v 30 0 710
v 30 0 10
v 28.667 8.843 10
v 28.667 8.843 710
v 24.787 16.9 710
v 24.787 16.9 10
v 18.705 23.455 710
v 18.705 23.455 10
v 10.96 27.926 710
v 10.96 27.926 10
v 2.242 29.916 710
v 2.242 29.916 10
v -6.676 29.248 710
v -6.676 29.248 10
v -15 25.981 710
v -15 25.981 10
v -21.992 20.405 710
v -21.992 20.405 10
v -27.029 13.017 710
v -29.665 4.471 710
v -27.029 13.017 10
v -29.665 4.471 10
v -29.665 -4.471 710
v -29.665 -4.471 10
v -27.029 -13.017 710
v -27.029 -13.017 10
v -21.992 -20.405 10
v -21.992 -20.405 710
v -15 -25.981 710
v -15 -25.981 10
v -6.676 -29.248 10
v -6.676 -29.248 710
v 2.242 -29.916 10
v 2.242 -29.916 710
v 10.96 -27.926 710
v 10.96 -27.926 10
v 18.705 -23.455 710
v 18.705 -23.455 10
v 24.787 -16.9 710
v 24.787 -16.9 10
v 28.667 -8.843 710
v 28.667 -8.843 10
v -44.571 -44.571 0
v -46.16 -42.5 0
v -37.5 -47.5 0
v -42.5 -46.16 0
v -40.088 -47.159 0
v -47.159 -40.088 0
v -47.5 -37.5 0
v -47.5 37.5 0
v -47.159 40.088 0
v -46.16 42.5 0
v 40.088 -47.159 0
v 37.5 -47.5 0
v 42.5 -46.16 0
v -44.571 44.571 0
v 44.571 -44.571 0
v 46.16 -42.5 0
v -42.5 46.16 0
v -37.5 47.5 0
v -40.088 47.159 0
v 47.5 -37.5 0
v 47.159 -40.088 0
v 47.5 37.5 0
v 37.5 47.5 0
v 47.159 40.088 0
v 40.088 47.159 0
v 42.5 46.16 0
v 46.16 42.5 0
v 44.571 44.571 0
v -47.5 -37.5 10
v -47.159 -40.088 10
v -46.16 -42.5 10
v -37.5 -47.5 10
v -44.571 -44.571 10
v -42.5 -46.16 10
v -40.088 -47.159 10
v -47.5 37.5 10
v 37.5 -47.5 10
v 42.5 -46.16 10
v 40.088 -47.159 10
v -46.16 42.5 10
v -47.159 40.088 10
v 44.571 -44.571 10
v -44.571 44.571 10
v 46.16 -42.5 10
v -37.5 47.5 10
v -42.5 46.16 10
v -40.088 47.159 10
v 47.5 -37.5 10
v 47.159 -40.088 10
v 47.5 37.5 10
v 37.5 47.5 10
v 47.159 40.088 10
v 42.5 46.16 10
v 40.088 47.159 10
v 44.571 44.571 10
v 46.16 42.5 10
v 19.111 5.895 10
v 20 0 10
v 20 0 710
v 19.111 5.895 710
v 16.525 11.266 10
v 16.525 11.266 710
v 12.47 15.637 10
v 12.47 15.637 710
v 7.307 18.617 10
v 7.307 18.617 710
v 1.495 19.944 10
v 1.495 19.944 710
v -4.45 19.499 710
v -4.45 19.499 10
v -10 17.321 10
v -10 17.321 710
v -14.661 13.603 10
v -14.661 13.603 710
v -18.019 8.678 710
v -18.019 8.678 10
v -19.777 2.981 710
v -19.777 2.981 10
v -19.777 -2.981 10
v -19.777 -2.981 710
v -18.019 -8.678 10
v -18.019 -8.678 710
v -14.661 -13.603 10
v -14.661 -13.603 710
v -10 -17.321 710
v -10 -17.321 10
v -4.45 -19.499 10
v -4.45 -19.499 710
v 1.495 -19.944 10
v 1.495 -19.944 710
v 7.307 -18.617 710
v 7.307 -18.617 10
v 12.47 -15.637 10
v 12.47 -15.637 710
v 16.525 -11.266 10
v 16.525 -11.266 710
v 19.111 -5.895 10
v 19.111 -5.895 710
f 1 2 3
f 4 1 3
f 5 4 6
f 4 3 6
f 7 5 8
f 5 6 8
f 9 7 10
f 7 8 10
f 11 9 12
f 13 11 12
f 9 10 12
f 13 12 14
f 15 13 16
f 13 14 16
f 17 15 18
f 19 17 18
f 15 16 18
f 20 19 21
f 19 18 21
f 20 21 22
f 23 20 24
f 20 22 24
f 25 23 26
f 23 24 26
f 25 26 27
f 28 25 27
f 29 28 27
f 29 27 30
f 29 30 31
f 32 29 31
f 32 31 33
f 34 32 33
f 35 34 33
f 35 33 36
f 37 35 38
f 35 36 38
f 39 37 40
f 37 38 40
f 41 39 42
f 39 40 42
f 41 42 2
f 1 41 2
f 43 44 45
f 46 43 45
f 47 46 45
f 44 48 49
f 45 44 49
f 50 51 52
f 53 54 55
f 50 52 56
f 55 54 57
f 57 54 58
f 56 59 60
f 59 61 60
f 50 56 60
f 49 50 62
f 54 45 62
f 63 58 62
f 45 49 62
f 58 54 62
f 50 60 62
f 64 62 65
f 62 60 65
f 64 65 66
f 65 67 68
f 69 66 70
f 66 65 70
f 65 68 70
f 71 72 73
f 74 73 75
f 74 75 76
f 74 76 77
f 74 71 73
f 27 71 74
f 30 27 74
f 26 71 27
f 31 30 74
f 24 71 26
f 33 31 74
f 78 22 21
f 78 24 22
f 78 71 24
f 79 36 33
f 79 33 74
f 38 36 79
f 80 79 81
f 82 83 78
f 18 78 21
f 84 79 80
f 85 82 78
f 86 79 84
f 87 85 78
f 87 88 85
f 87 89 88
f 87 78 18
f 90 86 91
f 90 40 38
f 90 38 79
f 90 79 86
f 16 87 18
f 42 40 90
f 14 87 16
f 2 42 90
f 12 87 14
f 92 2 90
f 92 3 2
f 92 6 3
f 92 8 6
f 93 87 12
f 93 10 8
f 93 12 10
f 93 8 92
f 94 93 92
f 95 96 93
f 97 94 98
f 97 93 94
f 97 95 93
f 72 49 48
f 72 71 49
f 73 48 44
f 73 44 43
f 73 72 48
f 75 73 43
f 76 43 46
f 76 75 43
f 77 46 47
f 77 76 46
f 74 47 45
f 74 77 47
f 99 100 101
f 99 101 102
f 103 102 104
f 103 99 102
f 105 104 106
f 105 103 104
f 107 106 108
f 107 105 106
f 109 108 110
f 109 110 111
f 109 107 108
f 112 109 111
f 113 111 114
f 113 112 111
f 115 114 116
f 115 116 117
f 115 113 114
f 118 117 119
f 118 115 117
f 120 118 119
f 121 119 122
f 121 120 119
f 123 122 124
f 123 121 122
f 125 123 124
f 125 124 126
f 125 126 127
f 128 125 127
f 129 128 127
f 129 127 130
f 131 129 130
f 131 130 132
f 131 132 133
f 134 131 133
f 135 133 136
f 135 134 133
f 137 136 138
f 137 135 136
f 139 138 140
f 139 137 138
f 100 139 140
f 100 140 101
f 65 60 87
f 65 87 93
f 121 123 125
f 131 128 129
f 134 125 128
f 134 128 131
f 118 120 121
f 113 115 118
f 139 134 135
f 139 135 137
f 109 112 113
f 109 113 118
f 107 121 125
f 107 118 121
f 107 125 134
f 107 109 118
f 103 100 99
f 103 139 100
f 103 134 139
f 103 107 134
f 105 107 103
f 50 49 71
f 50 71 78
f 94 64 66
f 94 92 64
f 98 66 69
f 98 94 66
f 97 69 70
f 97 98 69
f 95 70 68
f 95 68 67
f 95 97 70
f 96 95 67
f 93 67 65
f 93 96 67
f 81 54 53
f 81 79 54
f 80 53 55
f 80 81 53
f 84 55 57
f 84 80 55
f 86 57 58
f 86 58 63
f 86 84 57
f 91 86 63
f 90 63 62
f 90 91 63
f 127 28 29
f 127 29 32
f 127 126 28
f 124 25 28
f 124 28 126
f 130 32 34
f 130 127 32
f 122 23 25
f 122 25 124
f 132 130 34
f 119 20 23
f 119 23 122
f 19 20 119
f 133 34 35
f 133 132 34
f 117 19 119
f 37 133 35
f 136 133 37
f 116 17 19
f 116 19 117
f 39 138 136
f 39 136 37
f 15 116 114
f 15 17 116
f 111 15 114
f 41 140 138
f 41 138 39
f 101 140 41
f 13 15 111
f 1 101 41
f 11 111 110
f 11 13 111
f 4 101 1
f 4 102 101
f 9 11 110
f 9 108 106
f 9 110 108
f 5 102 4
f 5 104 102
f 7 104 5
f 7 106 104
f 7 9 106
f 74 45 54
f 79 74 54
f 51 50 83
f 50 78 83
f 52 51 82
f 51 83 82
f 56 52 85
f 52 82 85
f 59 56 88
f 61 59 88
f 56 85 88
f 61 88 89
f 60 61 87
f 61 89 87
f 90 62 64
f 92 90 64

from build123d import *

# Parameters (mm, degrees)
PLATE_SKETCH_W      = 95
PLATE_SKETCH_H      = 95
PLATE_EXTRUDE_DEPTH = 10
PLATE_FILLET_R      = 10
POLE_SKETCH_R       = 30
POLE_SKETCH_R_2     = 20
POLE_EXTRUDE_DEPTH  = 700


with BuildPart() as part:
    # Plate Sketch → Plate Extrude (new body)
    with BuildSketch(Plane.XY):
        Rectangle(PLATE_SKETCH_W, PLATE_SKETCH_H)
    extrude(amount=PLATE_EXTRUDE_DEPTH)

    # Plate Fillet
    plate_fillet_edges = [part.edges().sort_by_distance(p)[0] for p in [
        (47.5, -47.5, 5),
        (-47.5, -47.5, 5),
        (-47.5, 47.5, 5),
        (47.5, 47.5, 5),
    ]]
    fillet(plate_fillet_edges, radius=PLATE_FILLET_R)

    # Pole Sketch → Pole Extrude (add)
    with BuildSketch(Plane.XY.offset(10)):
        Circle(POLE_SKETCH_R)
        Circle(POLE_SKETCH_R_2, mode=Mode.SUBTRACT)
    extrude(amount=POLE_EXTRUDE_DEPTH)


solid = part.part
